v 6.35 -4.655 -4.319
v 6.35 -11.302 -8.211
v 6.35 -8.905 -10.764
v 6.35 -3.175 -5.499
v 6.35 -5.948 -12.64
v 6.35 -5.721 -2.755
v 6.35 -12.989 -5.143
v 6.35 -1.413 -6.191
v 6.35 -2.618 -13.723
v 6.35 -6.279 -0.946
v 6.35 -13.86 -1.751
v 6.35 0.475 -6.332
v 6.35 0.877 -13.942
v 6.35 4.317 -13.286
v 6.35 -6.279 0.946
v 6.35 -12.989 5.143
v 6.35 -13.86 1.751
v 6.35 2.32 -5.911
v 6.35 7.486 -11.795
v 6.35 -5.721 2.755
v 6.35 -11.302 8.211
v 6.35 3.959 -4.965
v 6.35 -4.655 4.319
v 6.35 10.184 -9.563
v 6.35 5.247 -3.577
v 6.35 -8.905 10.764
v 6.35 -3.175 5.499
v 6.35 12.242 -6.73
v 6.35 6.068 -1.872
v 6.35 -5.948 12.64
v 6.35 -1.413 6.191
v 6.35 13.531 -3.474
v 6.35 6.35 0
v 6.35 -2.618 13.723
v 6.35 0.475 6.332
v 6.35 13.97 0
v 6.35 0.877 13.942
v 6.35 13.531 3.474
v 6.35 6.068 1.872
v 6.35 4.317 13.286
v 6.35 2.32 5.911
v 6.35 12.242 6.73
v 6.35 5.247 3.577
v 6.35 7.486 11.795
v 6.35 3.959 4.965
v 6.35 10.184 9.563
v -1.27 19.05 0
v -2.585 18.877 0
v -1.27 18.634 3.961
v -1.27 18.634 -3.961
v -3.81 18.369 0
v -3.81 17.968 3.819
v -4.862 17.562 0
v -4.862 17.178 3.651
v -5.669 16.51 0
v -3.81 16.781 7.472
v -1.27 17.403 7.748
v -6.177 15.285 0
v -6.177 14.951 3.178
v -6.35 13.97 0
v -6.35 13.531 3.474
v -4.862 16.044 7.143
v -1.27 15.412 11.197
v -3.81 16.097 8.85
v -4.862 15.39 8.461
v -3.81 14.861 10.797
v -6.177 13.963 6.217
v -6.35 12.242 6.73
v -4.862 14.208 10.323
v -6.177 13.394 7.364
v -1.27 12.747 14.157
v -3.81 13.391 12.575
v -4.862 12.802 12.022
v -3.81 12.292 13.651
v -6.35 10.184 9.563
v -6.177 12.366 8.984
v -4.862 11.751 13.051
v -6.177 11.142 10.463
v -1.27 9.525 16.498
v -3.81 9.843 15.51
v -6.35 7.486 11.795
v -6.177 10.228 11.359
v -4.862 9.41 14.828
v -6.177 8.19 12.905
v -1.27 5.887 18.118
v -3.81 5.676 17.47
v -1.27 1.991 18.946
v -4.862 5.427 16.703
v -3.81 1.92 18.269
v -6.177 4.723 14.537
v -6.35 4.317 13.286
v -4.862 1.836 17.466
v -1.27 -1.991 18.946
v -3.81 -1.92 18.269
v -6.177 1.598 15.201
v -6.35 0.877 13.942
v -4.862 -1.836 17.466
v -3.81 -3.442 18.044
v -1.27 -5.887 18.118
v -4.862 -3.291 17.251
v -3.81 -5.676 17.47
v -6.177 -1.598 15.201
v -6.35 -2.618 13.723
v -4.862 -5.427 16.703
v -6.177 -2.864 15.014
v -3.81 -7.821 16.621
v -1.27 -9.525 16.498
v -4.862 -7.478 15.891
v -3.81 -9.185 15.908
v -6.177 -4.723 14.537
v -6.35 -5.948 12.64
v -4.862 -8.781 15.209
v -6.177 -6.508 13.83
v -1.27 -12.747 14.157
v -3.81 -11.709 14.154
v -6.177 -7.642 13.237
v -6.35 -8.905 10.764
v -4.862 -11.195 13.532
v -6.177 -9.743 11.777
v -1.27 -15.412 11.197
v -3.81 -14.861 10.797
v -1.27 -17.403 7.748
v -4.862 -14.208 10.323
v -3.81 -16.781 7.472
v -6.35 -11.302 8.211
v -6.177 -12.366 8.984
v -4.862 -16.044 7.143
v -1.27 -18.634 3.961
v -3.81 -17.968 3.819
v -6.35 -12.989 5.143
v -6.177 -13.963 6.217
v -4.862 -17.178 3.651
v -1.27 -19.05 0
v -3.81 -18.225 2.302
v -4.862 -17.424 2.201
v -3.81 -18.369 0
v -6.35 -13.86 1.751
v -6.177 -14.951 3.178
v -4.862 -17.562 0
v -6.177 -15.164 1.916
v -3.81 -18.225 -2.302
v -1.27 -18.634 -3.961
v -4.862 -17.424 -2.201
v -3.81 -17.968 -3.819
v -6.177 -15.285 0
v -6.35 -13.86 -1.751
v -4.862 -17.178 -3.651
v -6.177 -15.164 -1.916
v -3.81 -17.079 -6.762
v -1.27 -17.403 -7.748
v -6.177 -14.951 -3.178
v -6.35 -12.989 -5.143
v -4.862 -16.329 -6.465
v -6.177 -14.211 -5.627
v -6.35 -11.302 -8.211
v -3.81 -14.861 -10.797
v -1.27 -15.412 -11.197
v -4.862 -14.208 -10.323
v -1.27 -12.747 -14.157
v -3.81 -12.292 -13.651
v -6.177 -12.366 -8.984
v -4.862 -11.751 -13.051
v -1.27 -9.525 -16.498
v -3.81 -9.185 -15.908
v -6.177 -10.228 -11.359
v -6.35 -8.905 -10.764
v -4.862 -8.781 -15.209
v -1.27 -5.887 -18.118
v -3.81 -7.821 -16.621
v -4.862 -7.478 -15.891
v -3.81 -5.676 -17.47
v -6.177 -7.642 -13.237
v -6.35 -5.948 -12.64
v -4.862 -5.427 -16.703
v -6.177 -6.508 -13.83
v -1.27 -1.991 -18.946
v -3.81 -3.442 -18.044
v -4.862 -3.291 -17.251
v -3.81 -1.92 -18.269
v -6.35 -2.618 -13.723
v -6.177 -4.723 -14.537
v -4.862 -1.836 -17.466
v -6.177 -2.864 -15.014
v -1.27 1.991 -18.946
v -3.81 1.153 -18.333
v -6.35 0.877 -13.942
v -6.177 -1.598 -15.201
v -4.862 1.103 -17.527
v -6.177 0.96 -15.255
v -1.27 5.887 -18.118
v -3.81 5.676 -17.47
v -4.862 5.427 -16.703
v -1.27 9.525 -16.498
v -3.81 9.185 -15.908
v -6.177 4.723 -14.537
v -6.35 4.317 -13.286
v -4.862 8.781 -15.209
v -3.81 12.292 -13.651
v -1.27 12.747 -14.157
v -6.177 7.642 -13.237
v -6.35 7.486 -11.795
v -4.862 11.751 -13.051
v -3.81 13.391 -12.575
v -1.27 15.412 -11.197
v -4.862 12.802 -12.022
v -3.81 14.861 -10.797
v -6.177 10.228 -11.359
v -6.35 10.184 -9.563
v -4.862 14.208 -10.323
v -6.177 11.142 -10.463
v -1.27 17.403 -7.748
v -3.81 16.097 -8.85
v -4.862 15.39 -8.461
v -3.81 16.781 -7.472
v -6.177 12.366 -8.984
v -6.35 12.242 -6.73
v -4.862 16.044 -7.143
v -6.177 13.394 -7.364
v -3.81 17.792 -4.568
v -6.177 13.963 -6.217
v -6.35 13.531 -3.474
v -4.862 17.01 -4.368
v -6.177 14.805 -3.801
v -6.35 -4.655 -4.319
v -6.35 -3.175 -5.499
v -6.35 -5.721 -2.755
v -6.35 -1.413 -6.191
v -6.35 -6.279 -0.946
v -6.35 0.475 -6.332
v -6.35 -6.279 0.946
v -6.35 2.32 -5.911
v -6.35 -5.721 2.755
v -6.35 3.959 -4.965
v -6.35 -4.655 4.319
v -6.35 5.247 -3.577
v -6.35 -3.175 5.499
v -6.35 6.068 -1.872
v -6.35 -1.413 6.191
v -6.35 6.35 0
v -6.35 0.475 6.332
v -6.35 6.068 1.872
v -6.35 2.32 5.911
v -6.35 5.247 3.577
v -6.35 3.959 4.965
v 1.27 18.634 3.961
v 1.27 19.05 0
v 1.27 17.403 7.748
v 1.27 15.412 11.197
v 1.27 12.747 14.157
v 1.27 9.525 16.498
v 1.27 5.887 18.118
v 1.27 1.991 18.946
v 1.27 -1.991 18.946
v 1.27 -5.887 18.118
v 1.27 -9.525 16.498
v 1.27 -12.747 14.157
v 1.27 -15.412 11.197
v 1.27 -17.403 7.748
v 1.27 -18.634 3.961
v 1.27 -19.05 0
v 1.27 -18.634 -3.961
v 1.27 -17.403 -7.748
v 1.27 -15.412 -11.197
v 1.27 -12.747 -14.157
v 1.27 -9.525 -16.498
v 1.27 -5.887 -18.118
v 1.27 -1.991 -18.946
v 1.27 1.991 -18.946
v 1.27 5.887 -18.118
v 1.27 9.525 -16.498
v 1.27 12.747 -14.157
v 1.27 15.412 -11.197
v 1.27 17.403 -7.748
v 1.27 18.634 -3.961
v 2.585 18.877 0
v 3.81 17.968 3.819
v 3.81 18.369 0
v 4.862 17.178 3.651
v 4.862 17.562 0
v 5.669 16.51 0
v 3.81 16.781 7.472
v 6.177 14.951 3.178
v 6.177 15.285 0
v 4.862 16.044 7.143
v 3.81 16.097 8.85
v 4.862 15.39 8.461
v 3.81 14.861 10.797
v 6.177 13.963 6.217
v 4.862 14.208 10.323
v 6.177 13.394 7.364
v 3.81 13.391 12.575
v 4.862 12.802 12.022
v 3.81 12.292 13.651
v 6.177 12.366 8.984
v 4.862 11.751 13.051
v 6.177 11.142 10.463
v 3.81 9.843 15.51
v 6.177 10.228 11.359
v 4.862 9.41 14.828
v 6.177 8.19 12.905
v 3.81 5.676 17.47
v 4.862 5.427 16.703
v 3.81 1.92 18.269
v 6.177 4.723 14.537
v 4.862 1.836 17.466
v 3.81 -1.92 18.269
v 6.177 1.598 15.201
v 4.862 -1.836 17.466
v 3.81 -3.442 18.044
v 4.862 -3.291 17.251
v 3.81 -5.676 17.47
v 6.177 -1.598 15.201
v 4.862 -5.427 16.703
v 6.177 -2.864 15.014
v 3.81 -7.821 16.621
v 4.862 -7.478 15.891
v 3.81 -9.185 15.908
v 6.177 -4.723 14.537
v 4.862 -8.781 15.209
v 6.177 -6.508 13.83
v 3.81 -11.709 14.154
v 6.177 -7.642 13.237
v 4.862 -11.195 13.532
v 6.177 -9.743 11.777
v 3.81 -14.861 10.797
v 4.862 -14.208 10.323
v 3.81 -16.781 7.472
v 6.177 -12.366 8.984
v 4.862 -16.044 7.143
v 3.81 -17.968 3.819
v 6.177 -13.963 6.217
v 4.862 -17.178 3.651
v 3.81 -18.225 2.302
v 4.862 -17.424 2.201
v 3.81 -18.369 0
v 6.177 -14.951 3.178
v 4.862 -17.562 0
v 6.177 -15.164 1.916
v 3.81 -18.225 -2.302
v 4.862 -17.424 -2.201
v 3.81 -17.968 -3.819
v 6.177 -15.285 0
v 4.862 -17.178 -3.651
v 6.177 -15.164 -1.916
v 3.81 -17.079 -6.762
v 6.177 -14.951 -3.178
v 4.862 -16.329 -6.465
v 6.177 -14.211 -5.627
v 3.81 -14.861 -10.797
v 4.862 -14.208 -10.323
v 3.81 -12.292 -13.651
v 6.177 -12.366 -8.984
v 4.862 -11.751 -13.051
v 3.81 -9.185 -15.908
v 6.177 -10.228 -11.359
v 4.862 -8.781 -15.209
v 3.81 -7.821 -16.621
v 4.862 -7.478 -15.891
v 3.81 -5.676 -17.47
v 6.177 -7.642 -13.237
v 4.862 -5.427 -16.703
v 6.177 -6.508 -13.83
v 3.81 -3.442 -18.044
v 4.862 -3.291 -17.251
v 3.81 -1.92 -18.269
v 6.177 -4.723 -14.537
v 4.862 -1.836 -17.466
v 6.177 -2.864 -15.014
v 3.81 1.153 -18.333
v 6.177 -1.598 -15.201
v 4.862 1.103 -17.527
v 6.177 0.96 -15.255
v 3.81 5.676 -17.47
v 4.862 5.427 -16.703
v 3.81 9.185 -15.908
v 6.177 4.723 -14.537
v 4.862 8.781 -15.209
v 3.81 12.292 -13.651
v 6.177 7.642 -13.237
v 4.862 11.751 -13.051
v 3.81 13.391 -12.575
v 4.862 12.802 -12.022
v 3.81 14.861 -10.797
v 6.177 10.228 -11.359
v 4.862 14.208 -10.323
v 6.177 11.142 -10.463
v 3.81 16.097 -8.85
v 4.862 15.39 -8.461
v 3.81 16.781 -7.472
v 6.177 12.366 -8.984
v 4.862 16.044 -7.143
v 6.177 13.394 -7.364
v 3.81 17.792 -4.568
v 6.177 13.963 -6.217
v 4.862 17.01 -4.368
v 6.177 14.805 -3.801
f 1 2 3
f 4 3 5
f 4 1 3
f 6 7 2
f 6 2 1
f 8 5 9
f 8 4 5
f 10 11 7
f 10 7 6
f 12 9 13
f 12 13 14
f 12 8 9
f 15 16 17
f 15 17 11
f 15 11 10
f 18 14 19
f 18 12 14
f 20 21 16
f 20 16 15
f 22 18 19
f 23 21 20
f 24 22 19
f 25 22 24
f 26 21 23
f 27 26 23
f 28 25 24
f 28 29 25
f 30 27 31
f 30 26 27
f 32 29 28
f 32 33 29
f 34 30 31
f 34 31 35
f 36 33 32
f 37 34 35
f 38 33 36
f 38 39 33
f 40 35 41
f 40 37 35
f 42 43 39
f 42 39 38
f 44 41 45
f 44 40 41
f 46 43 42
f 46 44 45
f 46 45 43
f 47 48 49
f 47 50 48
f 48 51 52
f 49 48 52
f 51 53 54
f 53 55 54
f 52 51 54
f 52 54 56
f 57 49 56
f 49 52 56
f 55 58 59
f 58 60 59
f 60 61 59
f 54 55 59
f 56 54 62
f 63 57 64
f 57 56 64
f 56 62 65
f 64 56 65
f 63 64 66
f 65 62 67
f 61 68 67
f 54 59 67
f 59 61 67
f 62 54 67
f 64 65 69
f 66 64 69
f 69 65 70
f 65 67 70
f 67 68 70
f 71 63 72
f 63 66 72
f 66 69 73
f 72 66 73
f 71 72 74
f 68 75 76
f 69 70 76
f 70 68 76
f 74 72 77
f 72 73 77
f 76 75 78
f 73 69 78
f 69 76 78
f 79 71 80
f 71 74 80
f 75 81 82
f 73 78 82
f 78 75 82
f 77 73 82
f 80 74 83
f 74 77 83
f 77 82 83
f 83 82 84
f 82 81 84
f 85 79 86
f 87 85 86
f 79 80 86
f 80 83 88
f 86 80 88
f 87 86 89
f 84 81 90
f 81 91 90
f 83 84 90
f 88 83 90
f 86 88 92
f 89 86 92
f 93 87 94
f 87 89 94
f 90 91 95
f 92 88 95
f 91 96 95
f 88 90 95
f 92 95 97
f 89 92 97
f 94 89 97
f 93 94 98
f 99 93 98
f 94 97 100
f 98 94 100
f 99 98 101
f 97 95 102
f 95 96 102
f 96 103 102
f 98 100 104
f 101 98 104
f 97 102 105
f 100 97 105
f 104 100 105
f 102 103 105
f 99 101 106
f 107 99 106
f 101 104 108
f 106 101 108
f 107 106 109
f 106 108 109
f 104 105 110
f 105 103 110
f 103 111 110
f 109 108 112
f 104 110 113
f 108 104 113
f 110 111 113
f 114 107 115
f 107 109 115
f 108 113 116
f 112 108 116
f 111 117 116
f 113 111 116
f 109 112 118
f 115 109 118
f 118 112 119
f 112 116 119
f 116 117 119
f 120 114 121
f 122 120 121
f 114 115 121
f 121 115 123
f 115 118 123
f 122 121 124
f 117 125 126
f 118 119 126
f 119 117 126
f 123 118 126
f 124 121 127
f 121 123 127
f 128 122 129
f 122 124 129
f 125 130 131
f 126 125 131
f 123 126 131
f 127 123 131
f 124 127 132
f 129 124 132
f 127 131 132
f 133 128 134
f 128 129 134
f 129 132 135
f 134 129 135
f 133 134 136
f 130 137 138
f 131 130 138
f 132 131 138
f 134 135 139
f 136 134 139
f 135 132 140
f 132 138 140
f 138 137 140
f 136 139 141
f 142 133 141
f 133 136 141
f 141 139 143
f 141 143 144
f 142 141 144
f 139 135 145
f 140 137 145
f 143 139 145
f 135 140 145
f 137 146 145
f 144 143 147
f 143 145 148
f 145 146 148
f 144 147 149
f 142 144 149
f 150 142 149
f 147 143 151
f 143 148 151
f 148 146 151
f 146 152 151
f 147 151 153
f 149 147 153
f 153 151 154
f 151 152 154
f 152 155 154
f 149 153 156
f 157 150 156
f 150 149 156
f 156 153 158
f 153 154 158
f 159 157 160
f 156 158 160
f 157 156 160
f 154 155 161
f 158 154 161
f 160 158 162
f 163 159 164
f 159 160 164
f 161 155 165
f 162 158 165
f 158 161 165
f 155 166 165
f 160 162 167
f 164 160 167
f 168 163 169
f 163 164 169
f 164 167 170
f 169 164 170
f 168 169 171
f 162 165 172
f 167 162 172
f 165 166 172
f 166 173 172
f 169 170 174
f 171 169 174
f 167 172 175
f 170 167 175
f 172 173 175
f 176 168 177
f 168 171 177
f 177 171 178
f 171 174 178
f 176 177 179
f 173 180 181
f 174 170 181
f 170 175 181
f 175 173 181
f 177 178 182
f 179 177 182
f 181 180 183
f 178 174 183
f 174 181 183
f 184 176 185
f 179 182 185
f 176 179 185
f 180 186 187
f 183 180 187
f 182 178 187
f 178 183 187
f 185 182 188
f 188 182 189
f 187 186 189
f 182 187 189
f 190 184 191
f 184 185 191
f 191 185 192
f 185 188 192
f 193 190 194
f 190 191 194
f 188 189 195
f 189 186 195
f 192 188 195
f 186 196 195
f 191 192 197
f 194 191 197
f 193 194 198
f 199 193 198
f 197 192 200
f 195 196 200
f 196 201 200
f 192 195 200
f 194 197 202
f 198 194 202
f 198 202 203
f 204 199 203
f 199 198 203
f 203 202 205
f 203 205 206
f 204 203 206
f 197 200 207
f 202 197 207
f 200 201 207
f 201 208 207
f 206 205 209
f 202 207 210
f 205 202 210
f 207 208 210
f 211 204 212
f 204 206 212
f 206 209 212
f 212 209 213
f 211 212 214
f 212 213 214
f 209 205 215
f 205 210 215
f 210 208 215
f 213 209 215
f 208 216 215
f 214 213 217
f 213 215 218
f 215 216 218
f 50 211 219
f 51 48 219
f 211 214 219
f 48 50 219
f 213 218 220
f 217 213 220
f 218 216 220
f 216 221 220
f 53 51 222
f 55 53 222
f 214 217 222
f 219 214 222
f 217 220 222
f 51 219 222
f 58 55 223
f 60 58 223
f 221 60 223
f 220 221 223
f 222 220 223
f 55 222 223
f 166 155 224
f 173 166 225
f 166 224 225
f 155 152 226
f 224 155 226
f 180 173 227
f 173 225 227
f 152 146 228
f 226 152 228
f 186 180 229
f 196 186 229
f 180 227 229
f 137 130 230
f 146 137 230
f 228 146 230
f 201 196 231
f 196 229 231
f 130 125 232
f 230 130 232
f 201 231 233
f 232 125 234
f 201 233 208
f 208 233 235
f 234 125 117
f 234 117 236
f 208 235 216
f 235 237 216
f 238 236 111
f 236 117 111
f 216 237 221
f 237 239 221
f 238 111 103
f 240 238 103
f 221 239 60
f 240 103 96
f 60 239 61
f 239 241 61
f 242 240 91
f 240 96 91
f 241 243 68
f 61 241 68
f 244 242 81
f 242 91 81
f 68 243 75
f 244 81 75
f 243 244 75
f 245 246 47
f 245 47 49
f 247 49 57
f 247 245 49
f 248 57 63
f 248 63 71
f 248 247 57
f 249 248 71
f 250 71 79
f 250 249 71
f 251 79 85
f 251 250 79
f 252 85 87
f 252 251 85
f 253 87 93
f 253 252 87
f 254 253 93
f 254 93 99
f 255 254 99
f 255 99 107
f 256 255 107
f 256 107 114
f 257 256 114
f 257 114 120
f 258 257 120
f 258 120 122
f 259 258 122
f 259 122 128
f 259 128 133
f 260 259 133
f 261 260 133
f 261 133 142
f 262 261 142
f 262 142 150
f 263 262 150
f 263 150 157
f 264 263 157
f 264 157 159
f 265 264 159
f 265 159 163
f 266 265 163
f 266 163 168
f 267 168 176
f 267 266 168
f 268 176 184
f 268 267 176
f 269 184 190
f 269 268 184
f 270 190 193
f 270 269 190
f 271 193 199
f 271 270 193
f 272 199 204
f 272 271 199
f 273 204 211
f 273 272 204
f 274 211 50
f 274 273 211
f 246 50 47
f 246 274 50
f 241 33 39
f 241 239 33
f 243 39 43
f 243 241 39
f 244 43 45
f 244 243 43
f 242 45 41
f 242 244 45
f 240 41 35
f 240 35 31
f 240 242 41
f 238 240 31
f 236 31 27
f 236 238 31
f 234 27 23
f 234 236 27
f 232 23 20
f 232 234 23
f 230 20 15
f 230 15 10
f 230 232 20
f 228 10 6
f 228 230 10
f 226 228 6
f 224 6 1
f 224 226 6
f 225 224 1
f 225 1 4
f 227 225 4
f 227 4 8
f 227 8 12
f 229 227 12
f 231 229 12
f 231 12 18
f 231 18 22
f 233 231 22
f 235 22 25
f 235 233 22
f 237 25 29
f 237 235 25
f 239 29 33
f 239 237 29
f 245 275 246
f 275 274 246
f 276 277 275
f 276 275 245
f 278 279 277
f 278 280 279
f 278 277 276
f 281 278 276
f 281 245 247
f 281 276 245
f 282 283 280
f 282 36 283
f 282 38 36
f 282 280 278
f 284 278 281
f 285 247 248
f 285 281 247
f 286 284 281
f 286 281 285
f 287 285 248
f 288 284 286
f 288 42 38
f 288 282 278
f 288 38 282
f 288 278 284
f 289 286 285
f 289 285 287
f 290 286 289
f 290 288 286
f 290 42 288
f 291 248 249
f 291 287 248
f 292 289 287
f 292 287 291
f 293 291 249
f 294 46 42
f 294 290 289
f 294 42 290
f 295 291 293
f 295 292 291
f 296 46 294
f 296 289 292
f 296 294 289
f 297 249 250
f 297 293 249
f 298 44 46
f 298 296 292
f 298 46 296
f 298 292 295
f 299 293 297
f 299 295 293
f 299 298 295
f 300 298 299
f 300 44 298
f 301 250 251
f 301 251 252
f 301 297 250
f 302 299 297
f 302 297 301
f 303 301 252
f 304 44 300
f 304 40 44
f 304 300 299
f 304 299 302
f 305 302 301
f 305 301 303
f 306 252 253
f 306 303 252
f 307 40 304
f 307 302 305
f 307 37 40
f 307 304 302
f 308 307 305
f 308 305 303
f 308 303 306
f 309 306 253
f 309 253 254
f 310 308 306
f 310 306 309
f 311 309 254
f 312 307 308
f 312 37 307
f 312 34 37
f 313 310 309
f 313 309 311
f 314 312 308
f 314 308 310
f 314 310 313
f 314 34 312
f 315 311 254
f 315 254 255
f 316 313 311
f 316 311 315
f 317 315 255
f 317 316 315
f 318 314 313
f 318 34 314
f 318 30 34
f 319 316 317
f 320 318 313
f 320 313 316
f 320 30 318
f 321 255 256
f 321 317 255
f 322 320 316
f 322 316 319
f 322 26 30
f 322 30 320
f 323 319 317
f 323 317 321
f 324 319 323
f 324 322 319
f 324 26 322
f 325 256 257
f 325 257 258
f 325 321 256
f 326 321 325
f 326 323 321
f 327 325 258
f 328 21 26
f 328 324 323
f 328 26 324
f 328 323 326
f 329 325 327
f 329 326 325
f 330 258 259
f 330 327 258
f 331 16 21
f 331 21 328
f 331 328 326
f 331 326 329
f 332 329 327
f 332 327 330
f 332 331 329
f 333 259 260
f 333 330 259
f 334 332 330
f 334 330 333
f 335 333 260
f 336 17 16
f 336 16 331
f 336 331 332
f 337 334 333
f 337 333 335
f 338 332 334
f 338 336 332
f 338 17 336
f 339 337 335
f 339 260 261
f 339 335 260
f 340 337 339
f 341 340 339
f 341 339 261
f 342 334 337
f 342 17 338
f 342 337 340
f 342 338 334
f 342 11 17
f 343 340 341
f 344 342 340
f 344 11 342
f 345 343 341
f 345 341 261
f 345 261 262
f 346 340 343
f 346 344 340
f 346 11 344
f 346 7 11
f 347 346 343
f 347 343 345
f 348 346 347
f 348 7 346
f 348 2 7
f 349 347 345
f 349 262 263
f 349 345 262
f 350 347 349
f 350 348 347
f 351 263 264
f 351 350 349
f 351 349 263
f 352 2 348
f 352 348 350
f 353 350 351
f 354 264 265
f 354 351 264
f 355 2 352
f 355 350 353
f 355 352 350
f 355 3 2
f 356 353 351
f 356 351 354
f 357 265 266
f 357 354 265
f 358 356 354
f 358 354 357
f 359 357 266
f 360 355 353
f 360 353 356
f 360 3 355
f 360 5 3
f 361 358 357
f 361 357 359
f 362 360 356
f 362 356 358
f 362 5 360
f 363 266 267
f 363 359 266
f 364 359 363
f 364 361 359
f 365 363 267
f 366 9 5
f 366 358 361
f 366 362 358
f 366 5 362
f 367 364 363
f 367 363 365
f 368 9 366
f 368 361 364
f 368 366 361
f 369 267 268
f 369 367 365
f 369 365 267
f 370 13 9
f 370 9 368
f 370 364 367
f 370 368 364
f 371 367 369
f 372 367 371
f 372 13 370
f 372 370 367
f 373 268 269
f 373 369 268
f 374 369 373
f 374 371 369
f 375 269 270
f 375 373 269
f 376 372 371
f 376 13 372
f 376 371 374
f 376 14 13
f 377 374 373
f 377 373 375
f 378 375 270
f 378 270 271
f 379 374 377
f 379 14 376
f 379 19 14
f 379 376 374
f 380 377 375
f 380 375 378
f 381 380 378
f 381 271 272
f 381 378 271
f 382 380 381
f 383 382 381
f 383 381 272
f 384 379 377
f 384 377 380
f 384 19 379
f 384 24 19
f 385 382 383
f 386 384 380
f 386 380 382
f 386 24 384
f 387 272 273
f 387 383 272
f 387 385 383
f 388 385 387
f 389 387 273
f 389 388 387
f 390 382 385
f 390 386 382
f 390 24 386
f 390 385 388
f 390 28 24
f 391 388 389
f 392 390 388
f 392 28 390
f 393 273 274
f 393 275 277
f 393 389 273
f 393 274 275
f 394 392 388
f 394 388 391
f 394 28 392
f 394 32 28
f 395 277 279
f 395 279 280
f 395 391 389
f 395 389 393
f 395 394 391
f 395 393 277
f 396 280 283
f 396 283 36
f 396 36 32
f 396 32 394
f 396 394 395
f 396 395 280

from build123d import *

# Parameters (mm, degrees)
F0_R     = 19.05
F0_R_2   = 6.35
F1_DEPTH = 6.35
F2_R     = 5.08
F3_R     = 5.08


with BuildPart() as f1:
    # F0 (on Right) → F1 (new body, symmetric)
    with BuildSketch(Plane.YZ):
        Circle(F0_R)
        Circle(F0_R_2, mode=Mode.SUBTRACT)
    extrude(amount=F1_DEPTH, both=True)

    # F2
    f2_edges = [f1.edges().sort_by_distance(p)[0] for p in [
        (6.35, -19.05, 0),
    ]]
    fillet(f2_edges, radius=F2_R)

    # F3
    f3_edges = [f1.edges().sort_by_distance(p)[0] for p in [
        (-2.54, 19.05, 0),
        (1.27, -19.05, 0),
        (-6.35, -19.05, 0),
    ]]
    fillet(f3_edges, radius=F3_R)


solid = f1.part
